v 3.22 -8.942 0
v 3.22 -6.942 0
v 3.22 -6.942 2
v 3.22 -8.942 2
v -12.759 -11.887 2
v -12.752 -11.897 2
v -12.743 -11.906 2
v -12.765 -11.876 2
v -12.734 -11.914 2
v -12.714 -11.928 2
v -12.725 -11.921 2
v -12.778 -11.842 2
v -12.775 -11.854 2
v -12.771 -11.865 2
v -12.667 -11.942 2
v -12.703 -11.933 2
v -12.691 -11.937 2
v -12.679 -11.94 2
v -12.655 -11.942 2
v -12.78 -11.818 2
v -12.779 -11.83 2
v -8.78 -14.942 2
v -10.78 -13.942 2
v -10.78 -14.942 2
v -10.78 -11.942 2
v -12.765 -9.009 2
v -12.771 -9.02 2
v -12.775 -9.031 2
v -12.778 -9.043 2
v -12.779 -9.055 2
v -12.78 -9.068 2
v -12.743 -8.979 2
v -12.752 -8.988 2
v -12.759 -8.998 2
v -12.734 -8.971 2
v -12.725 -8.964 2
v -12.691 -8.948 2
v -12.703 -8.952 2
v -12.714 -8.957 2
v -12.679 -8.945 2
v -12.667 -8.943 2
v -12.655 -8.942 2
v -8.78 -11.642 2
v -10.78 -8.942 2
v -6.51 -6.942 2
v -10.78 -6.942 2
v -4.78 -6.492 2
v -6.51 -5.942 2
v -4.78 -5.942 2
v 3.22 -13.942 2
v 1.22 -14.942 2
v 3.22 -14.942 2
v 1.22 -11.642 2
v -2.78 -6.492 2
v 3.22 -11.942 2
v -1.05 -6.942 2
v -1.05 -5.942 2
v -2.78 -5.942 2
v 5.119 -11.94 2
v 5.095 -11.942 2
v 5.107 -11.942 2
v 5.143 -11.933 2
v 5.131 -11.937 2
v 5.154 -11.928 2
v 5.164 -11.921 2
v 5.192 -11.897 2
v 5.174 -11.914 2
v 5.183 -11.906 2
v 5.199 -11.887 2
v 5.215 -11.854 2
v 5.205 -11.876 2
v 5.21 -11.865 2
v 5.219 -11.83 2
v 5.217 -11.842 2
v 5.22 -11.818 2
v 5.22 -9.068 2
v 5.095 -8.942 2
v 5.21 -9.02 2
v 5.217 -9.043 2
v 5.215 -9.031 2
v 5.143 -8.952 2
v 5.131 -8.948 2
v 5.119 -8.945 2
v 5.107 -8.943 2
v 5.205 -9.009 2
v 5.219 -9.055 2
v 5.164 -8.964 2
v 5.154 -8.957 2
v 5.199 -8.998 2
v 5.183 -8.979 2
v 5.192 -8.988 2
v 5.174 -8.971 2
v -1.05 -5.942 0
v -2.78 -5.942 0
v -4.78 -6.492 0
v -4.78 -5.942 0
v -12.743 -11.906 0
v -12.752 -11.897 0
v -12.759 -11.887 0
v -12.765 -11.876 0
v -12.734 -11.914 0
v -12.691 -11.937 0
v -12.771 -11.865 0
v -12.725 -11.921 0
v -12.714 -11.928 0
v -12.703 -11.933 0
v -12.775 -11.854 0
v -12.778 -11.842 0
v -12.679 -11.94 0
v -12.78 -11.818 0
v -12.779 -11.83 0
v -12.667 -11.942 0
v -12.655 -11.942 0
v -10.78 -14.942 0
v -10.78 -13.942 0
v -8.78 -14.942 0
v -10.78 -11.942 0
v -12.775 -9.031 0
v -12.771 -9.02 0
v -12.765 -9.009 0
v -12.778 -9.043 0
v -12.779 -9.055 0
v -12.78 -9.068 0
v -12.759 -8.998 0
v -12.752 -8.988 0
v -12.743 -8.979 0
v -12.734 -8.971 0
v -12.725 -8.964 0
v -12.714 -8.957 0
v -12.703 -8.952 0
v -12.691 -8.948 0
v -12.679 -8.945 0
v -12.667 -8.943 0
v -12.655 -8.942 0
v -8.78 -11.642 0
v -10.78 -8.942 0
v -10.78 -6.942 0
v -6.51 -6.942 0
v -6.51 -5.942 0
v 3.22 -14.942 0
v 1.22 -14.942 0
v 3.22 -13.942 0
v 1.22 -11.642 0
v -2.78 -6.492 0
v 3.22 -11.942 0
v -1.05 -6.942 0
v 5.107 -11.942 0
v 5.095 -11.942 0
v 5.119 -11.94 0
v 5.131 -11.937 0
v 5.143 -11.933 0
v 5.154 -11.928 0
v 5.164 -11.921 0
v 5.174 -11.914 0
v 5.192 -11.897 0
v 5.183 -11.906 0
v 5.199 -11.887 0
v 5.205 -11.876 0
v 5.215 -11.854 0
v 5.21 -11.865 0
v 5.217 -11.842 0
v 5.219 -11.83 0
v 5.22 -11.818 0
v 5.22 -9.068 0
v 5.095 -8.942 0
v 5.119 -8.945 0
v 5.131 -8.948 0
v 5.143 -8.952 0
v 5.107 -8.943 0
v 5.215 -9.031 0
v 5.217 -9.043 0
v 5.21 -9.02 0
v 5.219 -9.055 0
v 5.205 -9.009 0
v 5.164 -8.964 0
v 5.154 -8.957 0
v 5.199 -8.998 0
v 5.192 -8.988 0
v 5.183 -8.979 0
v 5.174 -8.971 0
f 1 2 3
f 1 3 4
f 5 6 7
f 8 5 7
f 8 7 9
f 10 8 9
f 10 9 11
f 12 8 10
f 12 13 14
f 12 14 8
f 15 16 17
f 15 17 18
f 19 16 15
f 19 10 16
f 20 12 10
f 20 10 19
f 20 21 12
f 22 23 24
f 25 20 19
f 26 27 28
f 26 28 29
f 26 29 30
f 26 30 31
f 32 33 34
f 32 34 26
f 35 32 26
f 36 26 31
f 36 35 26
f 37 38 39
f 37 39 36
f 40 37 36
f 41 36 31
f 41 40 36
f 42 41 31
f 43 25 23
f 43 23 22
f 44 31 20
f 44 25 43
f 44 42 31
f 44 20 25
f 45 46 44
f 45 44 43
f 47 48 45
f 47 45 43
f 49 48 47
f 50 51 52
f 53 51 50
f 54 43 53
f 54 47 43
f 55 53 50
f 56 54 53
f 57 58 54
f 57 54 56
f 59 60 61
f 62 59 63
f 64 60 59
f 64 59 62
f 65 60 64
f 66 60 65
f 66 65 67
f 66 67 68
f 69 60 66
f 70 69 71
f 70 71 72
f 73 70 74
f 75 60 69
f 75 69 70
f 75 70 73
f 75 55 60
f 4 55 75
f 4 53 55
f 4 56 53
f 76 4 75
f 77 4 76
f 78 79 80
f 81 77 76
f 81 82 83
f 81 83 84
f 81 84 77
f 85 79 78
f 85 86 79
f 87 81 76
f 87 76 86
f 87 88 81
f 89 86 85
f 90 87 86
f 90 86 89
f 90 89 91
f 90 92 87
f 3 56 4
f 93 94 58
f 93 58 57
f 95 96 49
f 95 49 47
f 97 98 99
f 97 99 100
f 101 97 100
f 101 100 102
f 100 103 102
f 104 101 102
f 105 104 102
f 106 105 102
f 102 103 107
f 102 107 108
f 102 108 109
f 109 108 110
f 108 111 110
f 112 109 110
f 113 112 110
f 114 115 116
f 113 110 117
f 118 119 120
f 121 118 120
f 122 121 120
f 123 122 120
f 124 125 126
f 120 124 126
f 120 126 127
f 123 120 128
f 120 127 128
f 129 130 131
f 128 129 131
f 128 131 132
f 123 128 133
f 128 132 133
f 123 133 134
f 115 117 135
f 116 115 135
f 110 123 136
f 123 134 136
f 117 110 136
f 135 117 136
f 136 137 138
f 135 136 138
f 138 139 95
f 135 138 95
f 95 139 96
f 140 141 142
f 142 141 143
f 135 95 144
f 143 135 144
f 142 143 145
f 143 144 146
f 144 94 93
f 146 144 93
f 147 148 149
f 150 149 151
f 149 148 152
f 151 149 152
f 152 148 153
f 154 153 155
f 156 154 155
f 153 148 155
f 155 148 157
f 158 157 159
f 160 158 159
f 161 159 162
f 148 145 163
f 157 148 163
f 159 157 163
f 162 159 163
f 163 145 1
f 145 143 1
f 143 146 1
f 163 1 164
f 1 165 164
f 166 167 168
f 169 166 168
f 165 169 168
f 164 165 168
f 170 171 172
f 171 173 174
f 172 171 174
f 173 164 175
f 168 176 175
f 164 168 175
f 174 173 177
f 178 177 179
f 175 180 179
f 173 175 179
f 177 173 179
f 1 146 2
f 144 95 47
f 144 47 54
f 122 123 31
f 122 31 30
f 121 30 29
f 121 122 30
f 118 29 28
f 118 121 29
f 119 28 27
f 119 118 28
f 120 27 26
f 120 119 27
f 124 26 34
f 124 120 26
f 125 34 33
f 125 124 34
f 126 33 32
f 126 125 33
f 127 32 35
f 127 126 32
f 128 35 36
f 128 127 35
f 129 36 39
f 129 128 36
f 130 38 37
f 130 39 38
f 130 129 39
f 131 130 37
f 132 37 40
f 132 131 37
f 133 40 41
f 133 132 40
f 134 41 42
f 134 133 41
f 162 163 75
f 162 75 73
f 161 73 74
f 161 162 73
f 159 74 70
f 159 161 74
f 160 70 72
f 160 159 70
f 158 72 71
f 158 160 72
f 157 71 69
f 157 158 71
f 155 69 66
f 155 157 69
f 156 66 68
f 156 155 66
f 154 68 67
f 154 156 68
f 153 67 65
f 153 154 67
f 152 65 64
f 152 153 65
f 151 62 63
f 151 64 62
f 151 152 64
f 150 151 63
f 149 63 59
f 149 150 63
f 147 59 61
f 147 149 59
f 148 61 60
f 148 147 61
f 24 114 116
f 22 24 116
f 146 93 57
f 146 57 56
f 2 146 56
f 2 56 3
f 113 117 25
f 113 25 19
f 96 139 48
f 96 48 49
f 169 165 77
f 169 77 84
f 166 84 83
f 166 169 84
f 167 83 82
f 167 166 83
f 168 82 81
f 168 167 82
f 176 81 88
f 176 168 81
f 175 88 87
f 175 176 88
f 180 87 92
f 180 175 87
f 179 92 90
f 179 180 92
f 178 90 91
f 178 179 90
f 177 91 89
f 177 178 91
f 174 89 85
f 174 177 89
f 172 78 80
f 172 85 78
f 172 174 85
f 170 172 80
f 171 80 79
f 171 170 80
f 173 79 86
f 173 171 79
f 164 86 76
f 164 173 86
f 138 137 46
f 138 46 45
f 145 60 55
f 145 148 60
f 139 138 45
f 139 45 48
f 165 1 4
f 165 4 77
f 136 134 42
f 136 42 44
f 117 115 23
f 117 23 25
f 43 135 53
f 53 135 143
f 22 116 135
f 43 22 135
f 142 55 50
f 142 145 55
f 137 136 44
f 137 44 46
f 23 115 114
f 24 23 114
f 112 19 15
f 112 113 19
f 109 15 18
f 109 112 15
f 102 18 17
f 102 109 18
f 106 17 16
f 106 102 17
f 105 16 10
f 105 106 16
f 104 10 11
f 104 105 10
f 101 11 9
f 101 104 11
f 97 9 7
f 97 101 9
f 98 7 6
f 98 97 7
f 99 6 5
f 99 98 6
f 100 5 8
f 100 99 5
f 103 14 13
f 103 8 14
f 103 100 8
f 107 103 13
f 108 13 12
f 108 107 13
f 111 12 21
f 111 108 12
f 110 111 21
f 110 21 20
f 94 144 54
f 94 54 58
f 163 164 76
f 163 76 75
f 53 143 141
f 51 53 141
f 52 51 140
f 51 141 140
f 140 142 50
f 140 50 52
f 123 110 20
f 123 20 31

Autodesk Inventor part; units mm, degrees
ref_plane "YZ Plane" through (0, 0, 0) normal (1, 0, 0) x (0, 1, 0)
ref_plane "XZ Plane" through (0, 0, 0) normal (0, 1, 0) x (-1, 0, 0)
ref_plane "XY Plane" through (0, 0, 0) normal (0, 0, 1) x (1, 0, 0)
sketch "Unit" plane through (0, 0, 0) normal (0, 0, 1) x (1, 0, 0)
  line L0 (17.4453, 22.2497) -> (21.7153, 22.2497)
  line L1 (21.7153, 22.2497) -> (21.7153, 23.2497)
  line L2 (21.7153, 23.2497) -> (23.4453, 23.2497)
  line L3 (21.7153, 23.2497) -> (21.7153, 24.9797) construction
  line L4 (23.4453, 23.2497) -> (23.4453, 22.6997)
  line L5 (23.4453, 22.6997) -> (25.4453, 22.6997)
  line L6 (25.4453, 22.6997) -> (25.4453, 23.2497)
  line L7 (25.4453, 23.2497) -> (27.1753, 23.2497)
  line L8 (27.1753, 23.2497) -> (27.1753, 22.2497)
  line L9 (27.1753, 22.2497) -> (31.4453, 22.2497)
  line L10 (26.3953, 20.7497) -> (22.4953, 20.7497) construction
  line L11 (22.4953, 20.7497) -> (22.4953, 18.7497) construction
  line L12 (22.4953, 18.7497) -> (26.3953, 18.7497) construction
  line L13 (26.3953, 18.7497) -> (26.3953, 20.7497) construction
  line L14 (26.3953, 20.7497) -> (22.4953, 18.7497) construction
  line L15 (22.4953, 20.7497) -> (26.3953, 18.7497) construction
  point P0 (20.0288, 26.7181)
  point P1 (24.4453, 19.7497)
  dimension "d17" = 2
  dimension "d31" = 110
  dimension "d32" = 0
  dimension "d33" = 2
  dimension "d34" = 20
  dimension "d35" = 20
  dimension "d36" = 1.5
  dimension "d37" = 20.3526
  dimension "d2" = 1
  dimension "d3" = 1.73
  dimension "d4" = 0.55
  dimension "d5" = 2
  dimension "d6" = 1.73
  dimension "d7" = 1
  dimension "d12" = 3.9
  dimension "d13" = 2
  dimension "d14" = 1.5
  dimension "d40" = 14
  dimension "d102" = 4.27
sketch "Anchor" plane through (0, 0, 0) normal (0, 0, 1) x (1, 0, 0)
  line L0 (2, 0) -> (2, 1.875)
  line L1 (2, 0) -> (3, 0) construction
  line L2 (2.125, 2) -> (4.875, 2)
  line L3 (5, 1.875) -> (5, 0)
  line L4 (5, 2) -> (7, 2) construction
  line L5 (0, 0) -> (2, 0)
  line L6 (5, 0) -> (7, 0)
  arc A0 (2.125, 2) -> (2, 1.875) centre (2.125, 1.875) ccw
  arc A1 (5, 1.875) -> (4.875, 2) centre (4.875, 1.875) ccw
  point P0 (9.1321, -0.6227)
  point P1 (2, 2)
  dimension "d69" = 15
  dimension "d45" = 2
  dimension "d46" = 2
  dimension "d47" = 3
  dimension "d48" = 2
  dimension "d60" = 2
  dimension "d67" = 0.125
sketch "Esquisse2" plane through (0, 0, 0) normal (0, 0, 1) x (1, 0, 0)
  line L0 (-10.7801, -14.9425) -> (-8.7801, -14.9425)
  line L1 (-10.7801, -13.9425) -> (-10.7801, -14.9425)
  line L2 (3.2199, -13.9425) -> (3.2199, -14.9425)
  line L3 (-8.7801, -14.9425) -> (-8.7801, -11.6425)
  line L4 (1.2199, -11.6425) -> (1.2199, -14.9425)
  line L5 (1.2199, -14.9425) -> (3.2199, -14.9425)
  line L6 (-8.7801, -11.6425) -> (1.2199, -11.6425)
  line L7 (-10.7801, -11.9425) -> (-12.6551, -11.9425)
  line L8 (-10.7801, -11.9425) -> (-10.7801, -10.9425) construction
  line L9 (-12.7801, -11.8175) -> (-12.7801, -9.0675)
  line L10 (-12.6551, -8.9425) -> (-10.7801, -8.9425)
  line L11 (-12.7801, -8.9425) -> (-12.7801, -6.9425) construction
  line L12 (-10.7801, -13.9425) -> (-10.7801, -11.9425)
  line L13 (-10.7801, -8.9425) -> (-10.7801, -6.9425)
  arc A0 (-12.7801, -11.8175) -> (-12.6551, -11.9425) centre (-12.6551, -11.8175) ccw
  arc A1 (-12.6551, -8.9425) -> (-12.7801, -9.0675) centre (-12.6551, -9.0675) ccw
  line L14 (3.2199, -8.9425) -> (5.0949, -8.9425)
  line L15 (3.2199, -8.9425) -> (3.2199, -9.9425) construction
  line L16 (5.2199, -9.0675) -> (5.2199, -11.8175)
  line L17 (5.0949, -11.9425) -> (3.2199, -11.9425)
  line L18 (5.2199, -11.9425) -> (5.2199, -13.9425) construction
  line L19 (3.2199, -6.9425) -> (3.2199, -8.9425)
  line L20 (3.2199, -11.9425) -> (3.2199, -13.9425)
  arc A2 (5.2199, -9.0675) -> (5.0949, -8.9425) centre (5.0949, -9.0675) ccw
  arc A3 (5.0949, -11.9425) -> (5.2199, -11.8175) centre (5.0949, -11.8175) ccw
  line L21 (-10.7801, -6.9425) -> (-6.5101, -6.9425)
  line L22 (-6.5101, -6.9425) -> (-6.5101, -5.9425)
  line L23 (-6.5101, -5.9425) -> (-4.7801, -5.9425)
  line L24 (-6.5101, -5.9425) -> (-6.5101, -4.2125) construction
  line L25 (-4.7801, -5.9425) -> (-4.7801, -6.4925)
  line L26 (-4.7801, -6.4925) -> (-2.7801, -6.4925)
  line L27 (-2.7801, -6.4925) -> (-2.7801, -5.9425)
  line L28 (-2.7801, -5.9425) -> (-1.0501, -5.9425)
  line L29 (-1.0501, -5.9425) -> (-1.0501, -6.9425)
  line L30 (-1.0501, -6.9425) -> (3.2199, -6.9425)
  line L31 (-1.8301, -8.4425) -> (-5.7301, -8.4425) construction
  line L32 (-5.7301, -8.4425) -> (-5.7301, -10.4425) construction
  line L33 (-5.7301, -10.4425) -> (-1.8301, -10.4425) construction
  line L34 (-1.8301, -10.4425) -> (-1.8301, -8.4425) construction
  line L35 (-1.8301, -8.4425) -> (-5.7301, -10.4425) construction
  line L36 (-5.7301, -8.4425) -> (-1.8301, -10.4425) construction
  point P0 (0, 0)
  point P1 (3.2199, -6.9425)
  point P2 (-10.7801, -6.9425)
  point P3 (-10.7803, -12.8535)
  point P4 (3.2197, -12.8535)
  dimension "d101" = 14
  dimension "d97" = 4.7
  dimension "d98" = 8
  dimension "d99" = 2
  dimension "d100" = 10
extrude "Extrusion1" add sketch "Esquisse2" along normal blind 2
equation "\"d35\" = d34"
equation "\"d6\" = d3"
equation "\"d7\" = d2"
equation "\"d13\" = sheet_thickness"
equation "\"d45\" = safe_distance"
equation "\"d46\" = sheet_thickness"
equation "\"d47\" = 1.5 * sheet_thickness"
equation "\"d48\" = sheet_thickness"
equation "\"d99\" = safe_distance"
equation "\"d71\" = sheet_thickness"
equation "\"d60\" = safe_distance"
equation "\"sheet_thickness\" = 2"
equation "\"safe_distance\" = 2"
properties part number "extra_switch_support" material "Acier inoxydable"
